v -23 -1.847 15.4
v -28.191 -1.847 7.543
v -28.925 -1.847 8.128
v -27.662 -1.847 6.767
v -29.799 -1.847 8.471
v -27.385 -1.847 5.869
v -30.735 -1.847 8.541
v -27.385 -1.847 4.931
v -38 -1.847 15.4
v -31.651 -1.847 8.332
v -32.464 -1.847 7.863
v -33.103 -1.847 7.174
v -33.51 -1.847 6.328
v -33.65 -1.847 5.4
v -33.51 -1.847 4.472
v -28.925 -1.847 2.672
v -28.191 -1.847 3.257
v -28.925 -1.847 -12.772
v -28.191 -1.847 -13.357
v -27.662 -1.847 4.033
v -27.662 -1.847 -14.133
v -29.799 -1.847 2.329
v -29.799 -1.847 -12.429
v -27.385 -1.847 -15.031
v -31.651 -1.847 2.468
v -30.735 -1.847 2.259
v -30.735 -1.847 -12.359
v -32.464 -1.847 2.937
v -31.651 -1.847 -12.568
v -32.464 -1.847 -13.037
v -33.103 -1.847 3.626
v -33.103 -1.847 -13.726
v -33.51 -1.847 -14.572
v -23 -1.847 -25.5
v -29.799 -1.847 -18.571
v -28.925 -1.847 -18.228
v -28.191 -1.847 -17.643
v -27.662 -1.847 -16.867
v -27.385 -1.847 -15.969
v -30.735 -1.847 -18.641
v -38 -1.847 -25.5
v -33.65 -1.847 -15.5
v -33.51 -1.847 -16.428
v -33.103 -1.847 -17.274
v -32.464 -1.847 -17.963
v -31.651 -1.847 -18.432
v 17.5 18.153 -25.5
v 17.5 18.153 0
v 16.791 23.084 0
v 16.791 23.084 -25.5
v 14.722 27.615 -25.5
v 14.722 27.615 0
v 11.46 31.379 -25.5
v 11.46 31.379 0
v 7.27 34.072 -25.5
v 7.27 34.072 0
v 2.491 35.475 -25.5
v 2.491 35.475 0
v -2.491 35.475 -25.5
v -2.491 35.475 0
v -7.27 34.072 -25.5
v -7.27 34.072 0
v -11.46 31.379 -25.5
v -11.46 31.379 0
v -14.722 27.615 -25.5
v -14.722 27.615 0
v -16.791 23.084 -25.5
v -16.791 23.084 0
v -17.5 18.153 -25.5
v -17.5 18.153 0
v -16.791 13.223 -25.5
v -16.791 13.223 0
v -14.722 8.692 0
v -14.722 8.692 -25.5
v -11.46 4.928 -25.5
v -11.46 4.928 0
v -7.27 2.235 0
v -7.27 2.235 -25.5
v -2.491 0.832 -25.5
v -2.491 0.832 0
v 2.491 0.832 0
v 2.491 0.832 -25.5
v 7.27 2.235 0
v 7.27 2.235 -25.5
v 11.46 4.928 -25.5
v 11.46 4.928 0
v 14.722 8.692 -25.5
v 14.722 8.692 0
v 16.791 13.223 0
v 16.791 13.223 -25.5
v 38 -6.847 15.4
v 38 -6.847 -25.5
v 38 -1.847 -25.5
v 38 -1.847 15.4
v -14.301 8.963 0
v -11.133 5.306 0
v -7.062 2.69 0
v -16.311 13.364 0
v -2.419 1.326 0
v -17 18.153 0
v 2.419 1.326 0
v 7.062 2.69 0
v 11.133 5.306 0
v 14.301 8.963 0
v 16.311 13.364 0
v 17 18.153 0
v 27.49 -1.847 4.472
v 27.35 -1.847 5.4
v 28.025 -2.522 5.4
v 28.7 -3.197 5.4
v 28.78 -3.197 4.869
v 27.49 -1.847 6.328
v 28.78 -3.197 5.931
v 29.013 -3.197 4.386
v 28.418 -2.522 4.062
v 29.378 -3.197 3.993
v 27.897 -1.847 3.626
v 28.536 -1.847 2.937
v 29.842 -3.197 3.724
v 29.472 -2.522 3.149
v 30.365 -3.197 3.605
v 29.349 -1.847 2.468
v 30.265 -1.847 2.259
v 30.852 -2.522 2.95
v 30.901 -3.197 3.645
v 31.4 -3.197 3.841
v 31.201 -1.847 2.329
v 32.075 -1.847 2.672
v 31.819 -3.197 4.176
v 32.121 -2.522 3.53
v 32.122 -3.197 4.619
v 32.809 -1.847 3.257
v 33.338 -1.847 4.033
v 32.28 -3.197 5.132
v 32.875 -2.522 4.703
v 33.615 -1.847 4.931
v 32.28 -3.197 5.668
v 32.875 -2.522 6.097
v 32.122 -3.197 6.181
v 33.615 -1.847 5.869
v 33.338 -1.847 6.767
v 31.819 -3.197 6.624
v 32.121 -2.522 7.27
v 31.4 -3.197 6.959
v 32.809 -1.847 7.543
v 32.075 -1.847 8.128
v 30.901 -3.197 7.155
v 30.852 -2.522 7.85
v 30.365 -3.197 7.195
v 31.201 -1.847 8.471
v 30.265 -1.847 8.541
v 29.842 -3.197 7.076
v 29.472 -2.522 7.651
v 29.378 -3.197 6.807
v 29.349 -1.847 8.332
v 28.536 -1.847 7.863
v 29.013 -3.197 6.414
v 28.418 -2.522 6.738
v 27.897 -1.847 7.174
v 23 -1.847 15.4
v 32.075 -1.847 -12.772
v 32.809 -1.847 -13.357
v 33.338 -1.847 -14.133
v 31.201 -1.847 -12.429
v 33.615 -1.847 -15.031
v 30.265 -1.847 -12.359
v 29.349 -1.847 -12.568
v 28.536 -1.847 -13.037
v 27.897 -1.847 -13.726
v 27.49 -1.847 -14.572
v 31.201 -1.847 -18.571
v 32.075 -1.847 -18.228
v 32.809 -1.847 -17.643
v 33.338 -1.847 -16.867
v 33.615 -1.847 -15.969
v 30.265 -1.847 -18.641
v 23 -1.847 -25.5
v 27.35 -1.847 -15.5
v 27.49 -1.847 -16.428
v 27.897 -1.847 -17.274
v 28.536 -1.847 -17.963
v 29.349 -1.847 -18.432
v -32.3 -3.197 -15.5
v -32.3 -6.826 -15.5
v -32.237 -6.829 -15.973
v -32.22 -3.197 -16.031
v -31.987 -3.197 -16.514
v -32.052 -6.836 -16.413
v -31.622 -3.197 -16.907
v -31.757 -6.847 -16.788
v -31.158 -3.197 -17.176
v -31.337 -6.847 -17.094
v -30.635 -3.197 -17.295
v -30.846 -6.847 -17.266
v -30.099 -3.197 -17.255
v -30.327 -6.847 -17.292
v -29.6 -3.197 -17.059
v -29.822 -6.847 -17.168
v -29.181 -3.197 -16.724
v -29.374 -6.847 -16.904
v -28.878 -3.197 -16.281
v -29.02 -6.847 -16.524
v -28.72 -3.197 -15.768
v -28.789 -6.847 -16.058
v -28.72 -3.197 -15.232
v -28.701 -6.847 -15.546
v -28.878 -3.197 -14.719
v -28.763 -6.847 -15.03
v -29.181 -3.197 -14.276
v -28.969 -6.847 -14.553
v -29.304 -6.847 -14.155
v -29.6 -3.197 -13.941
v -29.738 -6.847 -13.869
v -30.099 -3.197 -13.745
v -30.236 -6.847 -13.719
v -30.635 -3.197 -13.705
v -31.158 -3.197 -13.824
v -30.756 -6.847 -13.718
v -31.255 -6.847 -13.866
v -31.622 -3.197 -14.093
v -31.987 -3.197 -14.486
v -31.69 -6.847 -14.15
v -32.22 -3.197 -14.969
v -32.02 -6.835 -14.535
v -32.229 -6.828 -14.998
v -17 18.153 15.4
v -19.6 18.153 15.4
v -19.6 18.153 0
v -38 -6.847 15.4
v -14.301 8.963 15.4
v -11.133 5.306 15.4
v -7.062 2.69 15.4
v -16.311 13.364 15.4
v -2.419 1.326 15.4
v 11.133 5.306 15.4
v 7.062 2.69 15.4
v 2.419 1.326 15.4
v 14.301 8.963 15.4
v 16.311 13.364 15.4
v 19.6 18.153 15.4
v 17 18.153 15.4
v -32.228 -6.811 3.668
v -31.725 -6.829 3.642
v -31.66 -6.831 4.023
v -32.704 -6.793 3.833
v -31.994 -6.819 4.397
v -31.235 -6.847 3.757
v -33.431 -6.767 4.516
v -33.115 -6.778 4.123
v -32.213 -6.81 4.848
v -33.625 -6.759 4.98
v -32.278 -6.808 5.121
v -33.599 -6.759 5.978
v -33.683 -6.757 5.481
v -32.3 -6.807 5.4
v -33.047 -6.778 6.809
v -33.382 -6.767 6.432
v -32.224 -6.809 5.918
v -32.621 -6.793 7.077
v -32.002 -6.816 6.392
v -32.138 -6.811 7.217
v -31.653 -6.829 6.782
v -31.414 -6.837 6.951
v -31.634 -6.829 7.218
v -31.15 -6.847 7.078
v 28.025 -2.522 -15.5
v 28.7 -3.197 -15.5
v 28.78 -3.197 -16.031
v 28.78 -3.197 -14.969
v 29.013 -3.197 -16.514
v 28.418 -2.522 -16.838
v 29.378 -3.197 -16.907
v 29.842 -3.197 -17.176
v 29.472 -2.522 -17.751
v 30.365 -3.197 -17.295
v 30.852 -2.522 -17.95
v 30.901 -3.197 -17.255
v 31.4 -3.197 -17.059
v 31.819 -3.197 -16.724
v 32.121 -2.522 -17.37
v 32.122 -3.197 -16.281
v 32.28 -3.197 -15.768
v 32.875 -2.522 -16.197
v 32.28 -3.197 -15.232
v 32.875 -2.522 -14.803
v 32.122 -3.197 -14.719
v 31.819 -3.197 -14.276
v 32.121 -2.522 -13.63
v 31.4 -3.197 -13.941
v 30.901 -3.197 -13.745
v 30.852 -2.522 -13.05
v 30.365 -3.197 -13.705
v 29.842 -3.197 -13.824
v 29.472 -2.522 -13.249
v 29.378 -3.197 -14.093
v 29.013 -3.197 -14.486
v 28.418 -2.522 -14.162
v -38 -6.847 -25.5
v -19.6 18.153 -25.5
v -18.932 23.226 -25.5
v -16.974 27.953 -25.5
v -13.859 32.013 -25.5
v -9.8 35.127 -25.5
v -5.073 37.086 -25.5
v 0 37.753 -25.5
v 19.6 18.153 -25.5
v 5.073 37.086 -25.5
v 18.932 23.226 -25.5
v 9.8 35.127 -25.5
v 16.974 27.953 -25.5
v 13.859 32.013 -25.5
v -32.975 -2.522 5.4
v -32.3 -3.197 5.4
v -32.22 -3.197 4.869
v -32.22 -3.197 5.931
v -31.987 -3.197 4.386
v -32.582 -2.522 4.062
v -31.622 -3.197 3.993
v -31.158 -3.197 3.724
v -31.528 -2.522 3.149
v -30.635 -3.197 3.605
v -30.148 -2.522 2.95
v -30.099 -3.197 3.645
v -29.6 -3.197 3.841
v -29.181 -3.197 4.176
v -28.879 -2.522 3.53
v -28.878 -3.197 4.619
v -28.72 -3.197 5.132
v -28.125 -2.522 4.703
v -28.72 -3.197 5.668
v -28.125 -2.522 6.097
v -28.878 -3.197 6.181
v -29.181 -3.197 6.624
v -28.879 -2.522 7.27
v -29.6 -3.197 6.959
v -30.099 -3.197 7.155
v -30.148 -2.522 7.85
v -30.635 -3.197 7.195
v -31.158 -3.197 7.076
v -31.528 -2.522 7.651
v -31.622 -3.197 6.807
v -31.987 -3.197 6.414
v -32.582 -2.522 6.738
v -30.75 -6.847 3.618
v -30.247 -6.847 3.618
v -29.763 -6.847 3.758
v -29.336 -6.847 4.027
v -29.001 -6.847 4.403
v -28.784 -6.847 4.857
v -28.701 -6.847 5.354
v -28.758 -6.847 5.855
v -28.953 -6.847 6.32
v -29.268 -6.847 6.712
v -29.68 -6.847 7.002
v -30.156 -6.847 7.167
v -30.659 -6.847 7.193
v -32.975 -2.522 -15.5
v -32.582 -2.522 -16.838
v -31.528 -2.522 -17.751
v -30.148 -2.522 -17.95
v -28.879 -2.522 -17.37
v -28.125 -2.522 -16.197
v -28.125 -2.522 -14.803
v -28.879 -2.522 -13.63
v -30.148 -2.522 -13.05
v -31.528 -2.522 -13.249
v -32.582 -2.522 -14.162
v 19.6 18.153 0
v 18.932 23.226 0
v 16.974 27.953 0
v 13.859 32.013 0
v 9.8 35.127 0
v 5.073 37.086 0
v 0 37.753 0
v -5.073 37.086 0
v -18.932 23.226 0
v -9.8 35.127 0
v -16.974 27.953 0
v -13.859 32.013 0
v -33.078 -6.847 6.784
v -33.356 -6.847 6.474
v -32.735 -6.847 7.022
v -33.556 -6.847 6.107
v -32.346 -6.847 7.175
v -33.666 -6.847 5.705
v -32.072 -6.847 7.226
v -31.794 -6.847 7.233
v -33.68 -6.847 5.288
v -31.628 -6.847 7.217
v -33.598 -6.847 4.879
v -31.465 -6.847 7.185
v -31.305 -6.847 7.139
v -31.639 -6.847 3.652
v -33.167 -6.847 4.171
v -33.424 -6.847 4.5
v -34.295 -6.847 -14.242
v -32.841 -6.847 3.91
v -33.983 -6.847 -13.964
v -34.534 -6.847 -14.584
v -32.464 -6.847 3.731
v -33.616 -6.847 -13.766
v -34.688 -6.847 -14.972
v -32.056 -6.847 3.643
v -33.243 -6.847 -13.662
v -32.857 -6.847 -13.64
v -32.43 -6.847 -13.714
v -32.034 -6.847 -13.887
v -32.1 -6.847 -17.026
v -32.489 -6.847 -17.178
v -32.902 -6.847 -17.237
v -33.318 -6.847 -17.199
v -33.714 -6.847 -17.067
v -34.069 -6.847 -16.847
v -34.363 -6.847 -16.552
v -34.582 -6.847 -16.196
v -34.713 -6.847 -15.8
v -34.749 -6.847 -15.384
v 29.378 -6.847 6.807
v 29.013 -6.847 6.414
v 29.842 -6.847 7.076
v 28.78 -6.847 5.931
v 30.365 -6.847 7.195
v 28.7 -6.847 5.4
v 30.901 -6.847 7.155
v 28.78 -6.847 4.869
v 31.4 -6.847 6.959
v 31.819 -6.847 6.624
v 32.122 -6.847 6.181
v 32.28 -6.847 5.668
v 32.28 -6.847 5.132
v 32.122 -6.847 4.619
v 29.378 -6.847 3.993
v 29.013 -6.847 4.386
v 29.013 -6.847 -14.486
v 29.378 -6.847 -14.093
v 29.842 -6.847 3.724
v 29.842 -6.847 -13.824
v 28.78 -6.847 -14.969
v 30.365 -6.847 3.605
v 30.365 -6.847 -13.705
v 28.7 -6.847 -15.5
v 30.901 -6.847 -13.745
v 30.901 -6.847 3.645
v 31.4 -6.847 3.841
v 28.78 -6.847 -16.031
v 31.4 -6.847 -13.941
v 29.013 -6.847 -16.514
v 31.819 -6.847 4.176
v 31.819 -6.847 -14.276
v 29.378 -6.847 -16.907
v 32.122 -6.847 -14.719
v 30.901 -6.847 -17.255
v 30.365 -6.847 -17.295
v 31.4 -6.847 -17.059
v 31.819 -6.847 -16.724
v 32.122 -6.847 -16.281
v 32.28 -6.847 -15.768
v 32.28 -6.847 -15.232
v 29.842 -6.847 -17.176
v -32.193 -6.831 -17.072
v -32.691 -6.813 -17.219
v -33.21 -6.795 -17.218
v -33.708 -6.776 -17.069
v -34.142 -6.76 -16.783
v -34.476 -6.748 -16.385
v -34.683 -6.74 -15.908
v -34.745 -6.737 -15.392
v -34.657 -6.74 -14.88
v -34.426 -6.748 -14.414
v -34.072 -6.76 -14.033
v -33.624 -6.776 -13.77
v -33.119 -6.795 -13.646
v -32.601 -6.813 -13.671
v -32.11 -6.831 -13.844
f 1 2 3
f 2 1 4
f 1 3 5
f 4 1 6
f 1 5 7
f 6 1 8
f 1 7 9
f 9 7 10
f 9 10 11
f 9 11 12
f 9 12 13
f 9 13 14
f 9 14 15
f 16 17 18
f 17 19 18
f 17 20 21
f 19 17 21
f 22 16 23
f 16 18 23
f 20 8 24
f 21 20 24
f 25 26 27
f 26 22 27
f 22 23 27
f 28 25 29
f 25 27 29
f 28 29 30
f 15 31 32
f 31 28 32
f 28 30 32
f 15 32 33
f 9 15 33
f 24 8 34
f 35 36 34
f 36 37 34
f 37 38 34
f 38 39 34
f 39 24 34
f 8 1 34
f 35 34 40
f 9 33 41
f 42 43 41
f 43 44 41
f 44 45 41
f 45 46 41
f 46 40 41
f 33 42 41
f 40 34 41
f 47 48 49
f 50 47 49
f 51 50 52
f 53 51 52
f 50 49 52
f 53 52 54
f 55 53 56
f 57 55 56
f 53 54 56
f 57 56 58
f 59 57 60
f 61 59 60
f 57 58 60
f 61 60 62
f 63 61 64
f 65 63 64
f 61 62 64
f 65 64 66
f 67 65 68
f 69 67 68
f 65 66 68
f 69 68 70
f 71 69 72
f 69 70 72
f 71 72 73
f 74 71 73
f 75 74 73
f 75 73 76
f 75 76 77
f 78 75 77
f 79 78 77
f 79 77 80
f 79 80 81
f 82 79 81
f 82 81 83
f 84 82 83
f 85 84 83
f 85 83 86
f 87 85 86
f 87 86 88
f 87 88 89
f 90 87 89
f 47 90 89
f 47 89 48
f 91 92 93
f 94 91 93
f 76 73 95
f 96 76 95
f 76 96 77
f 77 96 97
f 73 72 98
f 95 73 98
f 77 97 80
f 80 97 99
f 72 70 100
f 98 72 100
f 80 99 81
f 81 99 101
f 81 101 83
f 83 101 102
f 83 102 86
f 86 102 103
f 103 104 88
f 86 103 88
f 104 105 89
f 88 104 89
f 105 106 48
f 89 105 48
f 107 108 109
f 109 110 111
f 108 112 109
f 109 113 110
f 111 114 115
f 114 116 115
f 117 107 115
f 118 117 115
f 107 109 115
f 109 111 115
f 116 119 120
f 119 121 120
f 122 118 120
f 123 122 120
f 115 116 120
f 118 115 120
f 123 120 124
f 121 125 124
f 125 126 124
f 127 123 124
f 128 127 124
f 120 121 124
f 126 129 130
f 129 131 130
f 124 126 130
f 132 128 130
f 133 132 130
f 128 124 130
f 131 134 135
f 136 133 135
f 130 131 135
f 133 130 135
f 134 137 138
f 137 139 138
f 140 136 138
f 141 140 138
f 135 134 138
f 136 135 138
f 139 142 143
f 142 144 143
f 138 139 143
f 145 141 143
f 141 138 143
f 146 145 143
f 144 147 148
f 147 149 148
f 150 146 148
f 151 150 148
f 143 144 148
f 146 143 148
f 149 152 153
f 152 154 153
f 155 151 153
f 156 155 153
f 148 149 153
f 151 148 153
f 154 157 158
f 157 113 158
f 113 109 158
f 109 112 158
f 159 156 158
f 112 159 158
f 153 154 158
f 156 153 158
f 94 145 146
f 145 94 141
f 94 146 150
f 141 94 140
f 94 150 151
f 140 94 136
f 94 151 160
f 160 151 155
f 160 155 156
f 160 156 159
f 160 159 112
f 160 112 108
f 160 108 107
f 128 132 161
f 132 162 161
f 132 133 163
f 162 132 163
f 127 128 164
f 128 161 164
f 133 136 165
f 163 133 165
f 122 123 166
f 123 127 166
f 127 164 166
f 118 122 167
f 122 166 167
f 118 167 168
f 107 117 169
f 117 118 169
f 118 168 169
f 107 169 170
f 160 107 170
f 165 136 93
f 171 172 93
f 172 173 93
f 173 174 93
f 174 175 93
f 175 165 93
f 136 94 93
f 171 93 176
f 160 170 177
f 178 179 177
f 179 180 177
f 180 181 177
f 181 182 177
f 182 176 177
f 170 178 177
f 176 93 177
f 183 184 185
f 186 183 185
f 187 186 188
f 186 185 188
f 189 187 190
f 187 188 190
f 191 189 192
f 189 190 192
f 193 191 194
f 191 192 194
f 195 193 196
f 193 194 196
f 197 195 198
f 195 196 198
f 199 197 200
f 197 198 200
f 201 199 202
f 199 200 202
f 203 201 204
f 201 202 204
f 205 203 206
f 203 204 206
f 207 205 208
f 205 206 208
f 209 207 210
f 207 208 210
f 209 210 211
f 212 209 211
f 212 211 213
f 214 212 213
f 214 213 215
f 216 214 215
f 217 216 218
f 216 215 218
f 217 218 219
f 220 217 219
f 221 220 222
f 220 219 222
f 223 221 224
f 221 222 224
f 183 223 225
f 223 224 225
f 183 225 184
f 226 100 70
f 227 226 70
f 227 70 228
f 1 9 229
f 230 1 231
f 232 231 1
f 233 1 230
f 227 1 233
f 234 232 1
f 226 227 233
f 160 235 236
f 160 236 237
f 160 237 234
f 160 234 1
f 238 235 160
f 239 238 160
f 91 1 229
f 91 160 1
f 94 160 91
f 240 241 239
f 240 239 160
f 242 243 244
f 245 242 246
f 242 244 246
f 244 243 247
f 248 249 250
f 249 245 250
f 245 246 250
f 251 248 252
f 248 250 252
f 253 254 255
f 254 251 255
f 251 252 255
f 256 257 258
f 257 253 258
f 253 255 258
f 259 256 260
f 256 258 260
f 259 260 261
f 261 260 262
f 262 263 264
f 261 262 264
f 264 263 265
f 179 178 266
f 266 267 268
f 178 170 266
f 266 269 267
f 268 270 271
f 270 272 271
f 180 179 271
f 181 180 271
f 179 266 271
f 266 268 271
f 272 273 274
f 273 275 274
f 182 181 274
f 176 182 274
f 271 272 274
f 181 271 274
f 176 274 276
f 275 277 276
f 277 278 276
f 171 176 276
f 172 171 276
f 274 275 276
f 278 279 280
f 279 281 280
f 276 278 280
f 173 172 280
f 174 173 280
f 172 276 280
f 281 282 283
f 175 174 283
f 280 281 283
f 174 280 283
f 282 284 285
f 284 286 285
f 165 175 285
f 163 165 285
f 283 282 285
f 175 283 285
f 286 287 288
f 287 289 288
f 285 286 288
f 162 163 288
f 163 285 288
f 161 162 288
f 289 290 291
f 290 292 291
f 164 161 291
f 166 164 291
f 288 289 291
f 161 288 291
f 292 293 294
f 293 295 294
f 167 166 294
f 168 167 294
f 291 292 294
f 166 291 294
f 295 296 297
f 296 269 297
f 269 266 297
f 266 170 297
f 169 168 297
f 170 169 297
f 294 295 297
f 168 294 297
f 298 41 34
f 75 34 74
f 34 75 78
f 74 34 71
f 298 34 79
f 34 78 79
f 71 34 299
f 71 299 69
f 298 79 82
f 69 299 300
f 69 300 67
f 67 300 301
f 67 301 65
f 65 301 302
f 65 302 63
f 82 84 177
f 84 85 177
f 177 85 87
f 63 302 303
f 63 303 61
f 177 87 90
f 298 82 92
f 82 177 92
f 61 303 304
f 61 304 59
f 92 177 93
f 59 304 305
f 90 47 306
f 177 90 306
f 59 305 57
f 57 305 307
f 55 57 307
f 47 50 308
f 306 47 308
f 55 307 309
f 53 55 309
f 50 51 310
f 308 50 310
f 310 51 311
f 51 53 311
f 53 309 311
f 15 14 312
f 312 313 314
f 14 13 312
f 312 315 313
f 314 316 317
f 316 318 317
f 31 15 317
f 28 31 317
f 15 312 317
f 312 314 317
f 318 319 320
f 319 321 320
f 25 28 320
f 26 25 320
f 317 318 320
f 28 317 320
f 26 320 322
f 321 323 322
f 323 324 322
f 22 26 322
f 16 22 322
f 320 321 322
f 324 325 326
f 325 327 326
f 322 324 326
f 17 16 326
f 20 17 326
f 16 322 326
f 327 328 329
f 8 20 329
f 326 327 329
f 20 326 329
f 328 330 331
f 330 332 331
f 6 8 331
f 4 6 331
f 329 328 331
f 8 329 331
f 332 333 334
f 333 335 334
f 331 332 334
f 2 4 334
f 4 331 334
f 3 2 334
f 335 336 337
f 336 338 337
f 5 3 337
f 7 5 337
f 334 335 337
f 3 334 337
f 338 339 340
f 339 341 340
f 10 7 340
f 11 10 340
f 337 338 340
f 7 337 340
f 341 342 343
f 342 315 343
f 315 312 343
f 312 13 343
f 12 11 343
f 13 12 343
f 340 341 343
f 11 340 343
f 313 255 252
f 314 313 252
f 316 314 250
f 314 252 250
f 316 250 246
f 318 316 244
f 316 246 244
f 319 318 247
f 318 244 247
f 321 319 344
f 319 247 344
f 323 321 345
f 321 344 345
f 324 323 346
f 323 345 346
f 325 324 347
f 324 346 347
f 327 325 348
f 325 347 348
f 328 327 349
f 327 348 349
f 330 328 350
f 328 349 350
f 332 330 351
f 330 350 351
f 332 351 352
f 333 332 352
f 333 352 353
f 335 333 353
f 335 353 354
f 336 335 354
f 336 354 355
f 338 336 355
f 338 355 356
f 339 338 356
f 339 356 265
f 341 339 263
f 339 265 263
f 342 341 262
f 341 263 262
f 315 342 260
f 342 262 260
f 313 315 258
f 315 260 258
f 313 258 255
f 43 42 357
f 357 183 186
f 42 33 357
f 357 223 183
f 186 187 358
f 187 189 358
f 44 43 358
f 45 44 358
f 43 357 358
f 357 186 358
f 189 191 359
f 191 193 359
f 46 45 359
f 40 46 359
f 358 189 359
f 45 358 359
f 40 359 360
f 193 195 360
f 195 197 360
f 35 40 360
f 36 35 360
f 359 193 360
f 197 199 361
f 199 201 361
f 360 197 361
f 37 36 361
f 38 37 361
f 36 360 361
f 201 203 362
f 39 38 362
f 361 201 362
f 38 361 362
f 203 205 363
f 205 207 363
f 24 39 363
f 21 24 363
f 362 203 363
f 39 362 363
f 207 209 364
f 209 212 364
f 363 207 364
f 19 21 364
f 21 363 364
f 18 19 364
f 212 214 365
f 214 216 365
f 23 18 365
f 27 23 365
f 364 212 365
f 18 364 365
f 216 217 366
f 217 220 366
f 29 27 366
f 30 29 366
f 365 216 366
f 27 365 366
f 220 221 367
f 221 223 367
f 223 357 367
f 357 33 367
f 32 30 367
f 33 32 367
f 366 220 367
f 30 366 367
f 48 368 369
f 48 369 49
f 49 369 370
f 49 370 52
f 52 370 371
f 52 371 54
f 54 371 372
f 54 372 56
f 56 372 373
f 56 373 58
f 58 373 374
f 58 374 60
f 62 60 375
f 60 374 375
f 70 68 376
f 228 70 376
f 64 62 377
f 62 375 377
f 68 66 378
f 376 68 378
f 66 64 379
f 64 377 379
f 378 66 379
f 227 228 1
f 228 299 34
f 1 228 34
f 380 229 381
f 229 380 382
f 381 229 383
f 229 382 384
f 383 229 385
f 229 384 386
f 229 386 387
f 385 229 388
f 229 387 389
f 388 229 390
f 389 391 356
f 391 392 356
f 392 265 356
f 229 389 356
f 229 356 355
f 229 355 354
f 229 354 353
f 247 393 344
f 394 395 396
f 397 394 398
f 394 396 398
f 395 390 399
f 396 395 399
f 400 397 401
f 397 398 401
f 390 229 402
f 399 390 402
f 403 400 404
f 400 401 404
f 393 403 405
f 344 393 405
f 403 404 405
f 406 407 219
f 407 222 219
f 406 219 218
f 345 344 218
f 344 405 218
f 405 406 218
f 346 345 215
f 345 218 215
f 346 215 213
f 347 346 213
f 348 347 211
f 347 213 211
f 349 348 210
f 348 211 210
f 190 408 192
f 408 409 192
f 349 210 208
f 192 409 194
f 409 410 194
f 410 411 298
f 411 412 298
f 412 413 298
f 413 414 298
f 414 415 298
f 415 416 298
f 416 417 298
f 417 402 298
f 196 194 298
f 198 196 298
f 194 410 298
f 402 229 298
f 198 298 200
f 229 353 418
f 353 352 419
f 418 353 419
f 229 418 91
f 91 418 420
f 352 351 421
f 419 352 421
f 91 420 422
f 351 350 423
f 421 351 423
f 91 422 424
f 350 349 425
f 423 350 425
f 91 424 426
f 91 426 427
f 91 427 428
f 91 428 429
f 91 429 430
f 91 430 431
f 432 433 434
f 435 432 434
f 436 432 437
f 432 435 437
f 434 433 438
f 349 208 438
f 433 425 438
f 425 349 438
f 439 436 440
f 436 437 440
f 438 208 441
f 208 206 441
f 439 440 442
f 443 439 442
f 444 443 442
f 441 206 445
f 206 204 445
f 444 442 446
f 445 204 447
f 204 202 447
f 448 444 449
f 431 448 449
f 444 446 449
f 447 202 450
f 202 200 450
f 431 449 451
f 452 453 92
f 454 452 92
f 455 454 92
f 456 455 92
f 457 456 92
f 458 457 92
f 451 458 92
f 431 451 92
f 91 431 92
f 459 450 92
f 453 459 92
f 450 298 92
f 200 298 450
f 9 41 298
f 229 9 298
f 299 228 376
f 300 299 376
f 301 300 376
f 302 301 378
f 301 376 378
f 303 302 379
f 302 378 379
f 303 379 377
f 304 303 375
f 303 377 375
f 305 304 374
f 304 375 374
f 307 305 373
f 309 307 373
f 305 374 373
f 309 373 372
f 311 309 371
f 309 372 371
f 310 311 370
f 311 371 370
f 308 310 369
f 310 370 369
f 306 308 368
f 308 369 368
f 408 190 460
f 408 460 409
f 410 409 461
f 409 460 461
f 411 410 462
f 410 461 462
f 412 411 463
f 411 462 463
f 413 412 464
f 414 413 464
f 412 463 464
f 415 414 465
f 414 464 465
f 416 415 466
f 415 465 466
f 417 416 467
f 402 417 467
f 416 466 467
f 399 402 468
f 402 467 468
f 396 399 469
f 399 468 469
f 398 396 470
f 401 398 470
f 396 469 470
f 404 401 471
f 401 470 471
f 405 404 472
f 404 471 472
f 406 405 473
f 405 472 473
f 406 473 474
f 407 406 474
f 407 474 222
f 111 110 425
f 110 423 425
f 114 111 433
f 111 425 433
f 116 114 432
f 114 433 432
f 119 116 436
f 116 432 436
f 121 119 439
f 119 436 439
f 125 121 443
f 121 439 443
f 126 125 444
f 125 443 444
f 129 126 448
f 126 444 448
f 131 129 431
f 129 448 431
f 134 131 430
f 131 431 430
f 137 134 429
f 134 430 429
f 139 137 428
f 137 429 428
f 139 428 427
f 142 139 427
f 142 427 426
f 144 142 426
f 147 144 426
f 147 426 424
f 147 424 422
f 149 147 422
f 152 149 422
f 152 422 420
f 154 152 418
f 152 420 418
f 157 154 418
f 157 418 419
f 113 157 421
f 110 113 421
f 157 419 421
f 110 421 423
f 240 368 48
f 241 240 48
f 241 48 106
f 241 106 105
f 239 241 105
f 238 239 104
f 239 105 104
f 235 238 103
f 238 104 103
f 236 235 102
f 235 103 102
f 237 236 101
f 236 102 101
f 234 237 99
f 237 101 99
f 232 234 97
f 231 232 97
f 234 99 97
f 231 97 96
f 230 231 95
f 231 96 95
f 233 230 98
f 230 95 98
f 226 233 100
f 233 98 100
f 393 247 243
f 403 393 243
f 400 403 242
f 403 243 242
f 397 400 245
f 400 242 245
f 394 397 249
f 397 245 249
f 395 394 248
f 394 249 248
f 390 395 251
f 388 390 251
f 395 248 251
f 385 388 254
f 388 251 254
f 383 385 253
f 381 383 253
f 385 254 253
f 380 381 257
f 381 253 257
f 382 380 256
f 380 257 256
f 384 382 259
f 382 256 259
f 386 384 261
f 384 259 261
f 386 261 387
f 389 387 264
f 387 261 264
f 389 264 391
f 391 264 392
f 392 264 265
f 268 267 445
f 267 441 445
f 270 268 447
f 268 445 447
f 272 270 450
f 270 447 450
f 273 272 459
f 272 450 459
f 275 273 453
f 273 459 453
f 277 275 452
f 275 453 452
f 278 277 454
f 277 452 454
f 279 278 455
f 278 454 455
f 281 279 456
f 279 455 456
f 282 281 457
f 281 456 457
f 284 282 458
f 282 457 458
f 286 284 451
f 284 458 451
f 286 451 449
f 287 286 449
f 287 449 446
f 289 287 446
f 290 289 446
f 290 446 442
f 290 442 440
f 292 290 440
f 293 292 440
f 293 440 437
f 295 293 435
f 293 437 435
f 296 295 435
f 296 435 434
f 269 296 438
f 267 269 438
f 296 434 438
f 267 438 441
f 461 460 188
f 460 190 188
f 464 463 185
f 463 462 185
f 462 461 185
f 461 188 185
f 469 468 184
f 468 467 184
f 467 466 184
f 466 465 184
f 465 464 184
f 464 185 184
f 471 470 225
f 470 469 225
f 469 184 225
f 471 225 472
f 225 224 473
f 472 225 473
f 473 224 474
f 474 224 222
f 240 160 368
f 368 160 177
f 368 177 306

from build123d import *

# Parameters (mm, degrees)
SKETCH1_R                                       = 17.5
BOSS_EXTRUDE9_DEPTH                             = 25.5
BOSS_EXTRUDE10_DEPTH                            = 15.4
BOSS_EXTRUDE10_DEPTH_BACK                       = 25.5
CSK_FOR_M3_FLAT_HEAD_MACHINE_SCREW1_D           = 3.6
CSK_FOR_M3_FLAT_HEAD_MACHINE_SCREW1_CSINK_D     = 6.3
CSK_FOR_M3_FLAT_HEAD_MACHINE_SCREW1_CSINK_ANGLE = 90
CSK_FOR_M3_FLAT_HEAD_MACHINE_SCREW2_D           = 3.6
CSK_FOR_M3_FLAT_HEAD_MACHINE_SCREW2_CSINK_D     = 6.3
CSK_FOR_M3_FLAT_HEAD_MACHINE_SCREW2_CSINK_ANGLE = 90
BOSS_EXTRUDE11_DEPTH                            = 15.4
CUT_EXTRUDE3_REACH                              = 549.129
SKETCH17_R                                      = 1.8


with BuildPart() as part:
    # Sketch1 → Boss-Extrude9 (new body)
    with BuildSketch(Plane.XY):
        with BuildLine():
            ThreePointArc((-19.6, 18.153395679), (0, 37.753395679), (19.6, 18.153395679))
            ThreePointArc((19.6, 18.153395679), (0, -1.446604321), (-19.6, 18.153395679))
        make_face()
        with Locations((0, 18.153395679)):
            Circle(SKETCH1_R, mode=Mode.SUBTRACT)
    extrude(amount=-BOSS_EXTRUDE9_DEPTH)

    # Sketch1<15> → Boss-Extrude10 (add, two sides: drawn at the far end of the back side and taken through both)
    with BuildSketch(Plane.XY.offset(-BOSS_EXTRUDE10_DEPTH_BACK)):
        with BuildLine():
            Line((-23, -1.846604321), (-38, -1.846604321))
            Line((-38, -1.846604321), (-38, -6.846604321))
            Line((-38, -6.846604321), (38, -6.846604321))
            Line((38, -6.846604321), (38, -1.846604321))
            Line((38, -1.846604321), (23, -1.846604321))
            Line((23, -1.846604321), (19.6, 18.153395679))
            ThreePointArc((19.6, 18.153395679), (0, -1.446604321), (-19.6, 18.153395679))
            Line((-19.6, 18.153395679), (-23, -1.846604321))
        make_face()
    extrude(amount=BOSS_EXTRUDE10_DEPTH + BOSS_EXTRUDE10_DEPTH_BACK)

    # CSK for M3 Flat Head Machine Screw1 (through all)
    with Locations(Plane(origin=(0, -1.846604321, 0), x_dir=(1, 0, 0), z_dir=(0, 1, 0))):
        with Locations((-30.5, 15.5), (-30.5, -5.4)):
            CounterSinkHole(CSK_FOR_M3_FLAT_HEAD_MACHINE_SCREW1_D / 2, CSK_FOR_M3_FLAT_HEAD_MACHINE_SCREW1_CSINK_D / 2, counter_sink_angle=CSK_FOR_M3_FLAT_HEAD_MACHINE_SCREW1_CSINK_ANGLE)

    # CSK for M3 Flat Head Machine Screw2 (through all)
    with Locations(Plane(origin=(0, -1.846604321, 0), x_dir=(1, 0, 0), z_dir=(0, 1, 0))):
        with Locations((30.5, -5.4), (30.5, 15.5)):
            CounterSinkHole(CSK_FOR_M3_FLAT_HEAD_MACHINE_SCREW2_D / 2, CSK_FOR_M3_FLAT_HEAD_MACHINE_SCREW2_CSINK_D / 2, counter_sink_angle=CSK_FOR_M3_FLAT_HEAD_MACHINE_SCREW2_CSINK_ANGLE)

    # Sketch1<19> → Boss-Extrude11 (add)
    with BuildSketch(Plane.XY):
        with BuildLine():
            ThreePointArc((-19.6, 18.153395679), (0, -1.446604321), (19.6, 18.153395679))
            Line((19.6, 18.153395679), (17, 18.153395679))
            ThreePointArc((17, 18.153395679), (0, 1.153395679), (-17, 18.153395679))
            Line((-17, 18.153395679), (-19.6, 18.153395679))
        make_face()
    extrude(amount=BOSS_EXTRUDE11_DEPTH)

    # Sketch17 → Cut-Extrude3 (cut, up to next)
    with BuildSketch(Plane(origin=(-499.24894984, 9.974554812, -84.308871479), x_dir=(0.050830850863694654, -0.0009181581696580717, 0.9987068546806156), z_dir=(0.0360908865319125, 0.9993480899541042, -0.0009181581696581681)), mode=Mode.PRIVATE) as cut_extrude3_sk1:
        with Locations((92.5, 462.5)):
            Circle(SKETCH17_R)
    cut_extrude3_tool1 = extrude(cut_extrude3_sk1.sketch, amount=-CUT_EXTRUDE3_REACH, mode=Mode.PRIVATE) & part.part
    # Sketch17 → Cut-Extrude3 (cut, up to next)
    with BuildSketch(Plane(origin=(-499.24894984, 9.974554812, -84.308871479), x_dir=(0.050830850863694654, -0.0009181581696580717, 0.9987068546806156), z_dir=(0.0360908865319125, 0.9993480899541042, -0.0009181581696581681)), mode=Mode.PRIVATE) as cut_extrude3_sk2:
        with Locations((113.4, 462.5)):
            Circle(SKETCH17_R)
    cut_extrude3_tool2 = extrude(cut_extrude3_sk2.sketch, amount=-CUT_EXTRUDE3_REACH, mode=Mode.PRIVATE) & part.part
    add(cut_extrude3_tool1.solids().sort_by_distance((-32.946684, -6.80241, -15.437756))[0], mode=Mode.SUBTRACT)
    add(cut_extrude3_tool2.solids().sort_by_distance((-31.884319, -6.821599, 5.435217))[0], mode=Mode.SUBTRACT)


solid = part.part
